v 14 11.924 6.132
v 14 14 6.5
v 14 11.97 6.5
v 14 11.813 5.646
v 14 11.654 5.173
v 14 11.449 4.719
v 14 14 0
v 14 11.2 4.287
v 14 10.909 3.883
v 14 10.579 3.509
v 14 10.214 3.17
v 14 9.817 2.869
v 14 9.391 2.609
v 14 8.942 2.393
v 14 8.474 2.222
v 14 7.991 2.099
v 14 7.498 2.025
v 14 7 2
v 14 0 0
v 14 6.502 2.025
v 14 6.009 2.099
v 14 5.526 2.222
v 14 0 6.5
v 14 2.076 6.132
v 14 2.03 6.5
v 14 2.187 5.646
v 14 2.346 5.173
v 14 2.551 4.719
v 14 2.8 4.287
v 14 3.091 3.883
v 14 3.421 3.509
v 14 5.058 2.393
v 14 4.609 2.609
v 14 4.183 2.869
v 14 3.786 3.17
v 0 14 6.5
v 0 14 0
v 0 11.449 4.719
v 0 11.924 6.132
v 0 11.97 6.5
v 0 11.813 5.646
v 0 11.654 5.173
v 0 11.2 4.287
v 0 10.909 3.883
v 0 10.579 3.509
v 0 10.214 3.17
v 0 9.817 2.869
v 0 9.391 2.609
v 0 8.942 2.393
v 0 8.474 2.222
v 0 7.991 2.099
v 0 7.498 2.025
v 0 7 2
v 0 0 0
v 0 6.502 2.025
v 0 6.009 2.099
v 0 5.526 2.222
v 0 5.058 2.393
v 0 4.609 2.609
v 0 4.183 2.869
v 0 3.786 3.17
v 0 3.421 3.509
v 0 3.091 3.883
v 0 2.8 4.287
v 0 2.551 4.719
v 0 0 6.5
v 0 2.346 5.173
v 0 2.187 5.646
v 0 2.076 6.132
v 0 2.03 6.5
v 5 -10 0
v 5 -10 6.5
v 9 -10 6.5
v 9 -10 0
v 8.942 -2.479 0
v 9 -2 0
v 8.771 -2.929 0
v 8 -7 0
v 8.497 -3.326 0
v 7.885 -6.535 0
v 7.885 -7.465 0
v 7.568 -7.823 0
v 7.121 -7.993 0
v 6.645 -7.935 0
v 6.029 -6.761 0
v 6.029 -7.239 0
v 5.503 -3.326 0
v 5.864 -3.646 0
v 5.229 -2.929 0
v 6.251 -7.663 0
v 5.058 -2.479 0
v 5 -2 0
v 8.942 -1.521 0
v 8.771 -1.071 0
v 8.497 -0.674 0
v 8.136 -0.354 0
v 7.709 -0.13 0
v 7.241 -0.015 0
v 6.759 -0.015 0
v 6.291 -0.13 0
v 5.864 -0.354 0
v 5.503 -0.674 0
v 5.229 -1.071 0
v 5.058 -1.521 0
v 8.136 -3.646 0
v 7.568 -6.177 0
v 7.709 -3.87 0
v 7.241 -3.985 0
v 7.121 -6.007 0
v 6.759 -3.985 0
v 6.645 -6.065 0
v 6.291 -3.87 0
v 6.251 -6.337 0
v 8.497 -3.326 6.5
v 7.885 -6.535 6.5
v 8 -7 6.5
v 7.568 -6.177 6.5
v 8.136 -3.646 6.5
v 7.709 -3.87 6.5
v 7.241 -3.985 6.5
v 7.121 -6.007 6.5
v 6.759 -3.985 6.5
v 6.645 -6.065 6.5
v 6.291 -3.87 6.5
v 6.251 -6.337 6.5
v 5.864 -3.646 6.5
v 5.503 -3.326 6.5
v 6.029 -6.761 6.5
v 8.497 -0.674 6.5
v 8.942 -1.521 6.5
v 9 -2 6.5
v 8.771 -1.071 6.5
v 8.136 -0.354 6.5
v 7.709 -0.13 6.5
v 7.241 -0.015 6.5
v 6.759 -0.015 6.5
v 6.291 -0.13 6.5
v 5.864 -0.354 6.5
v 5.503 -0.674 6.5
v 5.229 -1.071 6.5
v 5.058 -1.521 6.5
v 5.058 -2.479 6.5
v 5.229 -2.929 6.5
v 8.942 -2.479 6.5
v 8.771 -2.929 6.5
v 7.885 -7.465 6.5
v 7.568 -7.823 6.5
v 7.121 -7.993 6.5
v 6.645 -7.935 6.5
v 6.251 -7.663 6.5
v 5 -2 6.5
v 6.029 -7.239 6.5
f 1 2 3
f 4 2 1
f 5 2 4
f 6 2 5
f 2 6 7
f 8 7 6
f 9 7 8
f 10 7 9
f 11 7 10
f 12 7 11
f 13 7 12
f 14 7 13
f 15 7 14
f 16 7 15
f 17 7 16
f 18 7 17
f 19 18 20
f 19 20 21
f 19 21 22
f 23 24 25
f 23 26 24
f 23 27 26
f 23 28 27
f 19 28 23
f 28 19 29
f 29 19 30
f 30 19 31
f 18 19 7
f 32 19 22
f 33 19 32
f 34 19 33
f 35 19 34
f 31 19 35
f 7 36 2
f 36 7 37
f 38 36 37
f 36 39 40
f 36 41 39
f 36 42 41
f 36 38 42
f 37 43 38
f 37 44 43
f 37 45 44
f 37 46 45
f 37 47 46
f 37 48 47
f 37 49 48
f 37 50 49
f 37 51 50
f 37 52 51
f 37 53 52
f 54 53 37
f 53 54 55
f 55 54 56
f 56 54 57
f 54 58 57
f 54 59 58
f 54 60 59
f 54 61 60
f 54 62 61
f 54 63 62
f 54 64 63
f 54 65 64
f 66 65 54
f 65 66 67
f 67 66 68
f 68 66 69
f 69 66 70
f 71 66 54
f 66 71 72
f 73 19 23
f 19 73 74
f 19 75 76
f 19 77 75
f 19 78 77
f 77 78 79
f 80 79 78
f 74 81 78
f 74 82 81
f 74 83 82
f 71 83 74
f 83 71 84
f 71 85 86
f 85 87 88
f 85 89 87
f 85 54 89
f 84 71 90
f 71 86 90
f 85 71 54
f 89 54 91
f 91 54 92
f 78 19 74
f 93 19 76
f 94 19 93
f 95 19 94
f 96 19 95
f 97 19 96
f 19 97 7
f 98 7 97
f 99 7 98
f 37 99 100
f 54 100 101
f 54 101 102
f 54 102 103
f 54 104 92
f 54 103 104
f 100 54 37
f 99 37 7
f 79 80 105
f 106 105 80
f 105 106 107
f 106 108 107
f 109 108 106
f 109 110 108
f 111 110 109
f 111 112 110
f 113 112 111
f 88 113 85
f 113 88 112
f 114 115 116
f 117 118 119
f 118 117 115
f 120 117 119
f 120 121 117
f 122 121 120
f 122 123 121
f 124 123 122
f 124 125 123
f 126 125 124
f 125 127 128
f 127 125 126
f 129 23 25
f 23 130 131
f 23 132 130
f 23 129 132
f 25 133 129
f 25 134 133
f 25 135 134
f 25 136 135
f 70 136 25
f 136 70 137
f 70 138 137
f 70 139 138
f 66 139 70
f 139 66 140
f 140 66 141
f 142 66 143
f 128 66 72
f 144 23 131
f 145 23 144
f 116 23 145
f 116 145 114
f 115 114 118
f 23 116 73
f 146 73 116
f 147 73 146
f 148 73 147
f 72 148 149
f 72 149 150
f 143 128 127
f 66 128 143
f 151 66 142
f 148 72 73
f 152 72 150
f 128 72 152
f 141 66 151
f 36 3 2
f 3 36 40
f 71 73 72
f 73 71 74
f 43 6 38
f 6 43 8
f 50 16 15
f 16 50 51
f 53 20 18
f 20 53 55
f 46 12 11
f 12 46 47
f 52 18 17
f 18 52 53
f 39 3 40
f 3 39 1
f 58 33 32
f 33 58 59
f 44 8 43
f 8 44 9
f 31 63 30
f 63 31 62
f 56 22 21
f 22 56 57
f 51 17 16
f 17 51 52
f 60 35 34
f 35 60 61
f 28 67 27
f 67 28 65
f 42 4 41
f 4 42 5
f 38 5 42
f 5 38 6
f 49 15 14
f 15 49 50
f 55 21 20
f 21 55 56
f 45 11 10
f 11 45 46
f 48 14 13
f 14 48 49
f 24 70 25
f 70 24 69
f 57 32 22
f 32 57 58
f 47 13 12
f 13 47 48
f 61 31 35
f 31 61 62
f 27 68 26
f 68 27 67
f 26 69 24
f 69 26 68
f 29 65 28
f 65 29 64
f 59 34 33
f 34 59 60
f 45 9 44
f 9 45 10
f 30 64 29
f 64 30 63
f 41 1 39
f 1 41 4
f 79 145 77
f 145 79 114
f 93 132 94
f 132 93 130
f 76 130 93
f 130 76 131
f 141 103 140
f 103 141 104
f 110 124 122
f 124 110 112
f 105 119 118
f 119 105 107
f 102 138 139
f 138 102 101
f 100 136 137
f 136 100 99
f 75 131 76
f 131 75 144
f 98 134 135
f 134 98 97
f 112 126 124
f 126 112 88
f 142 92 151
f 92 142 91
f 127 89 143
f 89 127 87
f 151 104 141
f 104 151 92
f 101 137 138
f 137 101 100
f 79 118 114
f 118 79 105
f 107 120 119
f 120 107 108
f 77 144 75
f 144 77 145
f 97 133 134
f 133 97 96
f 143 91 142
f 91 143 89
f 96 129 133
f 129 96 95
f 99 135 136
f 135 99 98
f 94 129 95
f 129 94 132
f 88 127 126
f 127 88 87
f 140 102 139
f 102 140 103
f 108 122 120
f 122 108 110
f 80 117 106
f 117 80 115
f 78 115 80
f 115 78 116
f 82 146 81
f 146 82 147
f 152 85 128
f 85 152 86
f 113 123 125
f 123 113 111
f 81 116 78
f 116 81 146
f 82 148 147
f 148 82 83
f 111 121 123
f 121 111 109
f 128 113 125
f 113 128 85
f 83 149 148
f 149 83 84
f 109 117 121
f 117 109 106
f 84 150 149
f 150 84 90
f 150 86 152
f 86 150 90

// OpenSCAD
// Mounting a drum stick to a motor
// Developed for LARS, never used
$fa=1/1;
$fs=1/2;
bissl=1/100;
shaft=2;
wall=2;
stick=10;
width=stick+2*wall;
compression=1;
screw=4;

difference() {
  hull() {
    cube([width,width,width/2-compression/2]);
    translate([stick/2,-3*wall-screw,0]) cube([2*wall,3*wall+screw,width/2-compression/2]);
  }
  translate([-bissl,width/2,width/2])rotate([0,90,0])cylinder(d=10,h=width+2*bissl);
  translate([width/2,-screw/2,-bissl])cylinder(d=screw,h=width/2-compression/2+2*bissl);
  translate([width/2,-screw-wall-shaft/2,-bissl])cylinder(d=shaft,h=width/2-compression/2+2*bissl);
}
